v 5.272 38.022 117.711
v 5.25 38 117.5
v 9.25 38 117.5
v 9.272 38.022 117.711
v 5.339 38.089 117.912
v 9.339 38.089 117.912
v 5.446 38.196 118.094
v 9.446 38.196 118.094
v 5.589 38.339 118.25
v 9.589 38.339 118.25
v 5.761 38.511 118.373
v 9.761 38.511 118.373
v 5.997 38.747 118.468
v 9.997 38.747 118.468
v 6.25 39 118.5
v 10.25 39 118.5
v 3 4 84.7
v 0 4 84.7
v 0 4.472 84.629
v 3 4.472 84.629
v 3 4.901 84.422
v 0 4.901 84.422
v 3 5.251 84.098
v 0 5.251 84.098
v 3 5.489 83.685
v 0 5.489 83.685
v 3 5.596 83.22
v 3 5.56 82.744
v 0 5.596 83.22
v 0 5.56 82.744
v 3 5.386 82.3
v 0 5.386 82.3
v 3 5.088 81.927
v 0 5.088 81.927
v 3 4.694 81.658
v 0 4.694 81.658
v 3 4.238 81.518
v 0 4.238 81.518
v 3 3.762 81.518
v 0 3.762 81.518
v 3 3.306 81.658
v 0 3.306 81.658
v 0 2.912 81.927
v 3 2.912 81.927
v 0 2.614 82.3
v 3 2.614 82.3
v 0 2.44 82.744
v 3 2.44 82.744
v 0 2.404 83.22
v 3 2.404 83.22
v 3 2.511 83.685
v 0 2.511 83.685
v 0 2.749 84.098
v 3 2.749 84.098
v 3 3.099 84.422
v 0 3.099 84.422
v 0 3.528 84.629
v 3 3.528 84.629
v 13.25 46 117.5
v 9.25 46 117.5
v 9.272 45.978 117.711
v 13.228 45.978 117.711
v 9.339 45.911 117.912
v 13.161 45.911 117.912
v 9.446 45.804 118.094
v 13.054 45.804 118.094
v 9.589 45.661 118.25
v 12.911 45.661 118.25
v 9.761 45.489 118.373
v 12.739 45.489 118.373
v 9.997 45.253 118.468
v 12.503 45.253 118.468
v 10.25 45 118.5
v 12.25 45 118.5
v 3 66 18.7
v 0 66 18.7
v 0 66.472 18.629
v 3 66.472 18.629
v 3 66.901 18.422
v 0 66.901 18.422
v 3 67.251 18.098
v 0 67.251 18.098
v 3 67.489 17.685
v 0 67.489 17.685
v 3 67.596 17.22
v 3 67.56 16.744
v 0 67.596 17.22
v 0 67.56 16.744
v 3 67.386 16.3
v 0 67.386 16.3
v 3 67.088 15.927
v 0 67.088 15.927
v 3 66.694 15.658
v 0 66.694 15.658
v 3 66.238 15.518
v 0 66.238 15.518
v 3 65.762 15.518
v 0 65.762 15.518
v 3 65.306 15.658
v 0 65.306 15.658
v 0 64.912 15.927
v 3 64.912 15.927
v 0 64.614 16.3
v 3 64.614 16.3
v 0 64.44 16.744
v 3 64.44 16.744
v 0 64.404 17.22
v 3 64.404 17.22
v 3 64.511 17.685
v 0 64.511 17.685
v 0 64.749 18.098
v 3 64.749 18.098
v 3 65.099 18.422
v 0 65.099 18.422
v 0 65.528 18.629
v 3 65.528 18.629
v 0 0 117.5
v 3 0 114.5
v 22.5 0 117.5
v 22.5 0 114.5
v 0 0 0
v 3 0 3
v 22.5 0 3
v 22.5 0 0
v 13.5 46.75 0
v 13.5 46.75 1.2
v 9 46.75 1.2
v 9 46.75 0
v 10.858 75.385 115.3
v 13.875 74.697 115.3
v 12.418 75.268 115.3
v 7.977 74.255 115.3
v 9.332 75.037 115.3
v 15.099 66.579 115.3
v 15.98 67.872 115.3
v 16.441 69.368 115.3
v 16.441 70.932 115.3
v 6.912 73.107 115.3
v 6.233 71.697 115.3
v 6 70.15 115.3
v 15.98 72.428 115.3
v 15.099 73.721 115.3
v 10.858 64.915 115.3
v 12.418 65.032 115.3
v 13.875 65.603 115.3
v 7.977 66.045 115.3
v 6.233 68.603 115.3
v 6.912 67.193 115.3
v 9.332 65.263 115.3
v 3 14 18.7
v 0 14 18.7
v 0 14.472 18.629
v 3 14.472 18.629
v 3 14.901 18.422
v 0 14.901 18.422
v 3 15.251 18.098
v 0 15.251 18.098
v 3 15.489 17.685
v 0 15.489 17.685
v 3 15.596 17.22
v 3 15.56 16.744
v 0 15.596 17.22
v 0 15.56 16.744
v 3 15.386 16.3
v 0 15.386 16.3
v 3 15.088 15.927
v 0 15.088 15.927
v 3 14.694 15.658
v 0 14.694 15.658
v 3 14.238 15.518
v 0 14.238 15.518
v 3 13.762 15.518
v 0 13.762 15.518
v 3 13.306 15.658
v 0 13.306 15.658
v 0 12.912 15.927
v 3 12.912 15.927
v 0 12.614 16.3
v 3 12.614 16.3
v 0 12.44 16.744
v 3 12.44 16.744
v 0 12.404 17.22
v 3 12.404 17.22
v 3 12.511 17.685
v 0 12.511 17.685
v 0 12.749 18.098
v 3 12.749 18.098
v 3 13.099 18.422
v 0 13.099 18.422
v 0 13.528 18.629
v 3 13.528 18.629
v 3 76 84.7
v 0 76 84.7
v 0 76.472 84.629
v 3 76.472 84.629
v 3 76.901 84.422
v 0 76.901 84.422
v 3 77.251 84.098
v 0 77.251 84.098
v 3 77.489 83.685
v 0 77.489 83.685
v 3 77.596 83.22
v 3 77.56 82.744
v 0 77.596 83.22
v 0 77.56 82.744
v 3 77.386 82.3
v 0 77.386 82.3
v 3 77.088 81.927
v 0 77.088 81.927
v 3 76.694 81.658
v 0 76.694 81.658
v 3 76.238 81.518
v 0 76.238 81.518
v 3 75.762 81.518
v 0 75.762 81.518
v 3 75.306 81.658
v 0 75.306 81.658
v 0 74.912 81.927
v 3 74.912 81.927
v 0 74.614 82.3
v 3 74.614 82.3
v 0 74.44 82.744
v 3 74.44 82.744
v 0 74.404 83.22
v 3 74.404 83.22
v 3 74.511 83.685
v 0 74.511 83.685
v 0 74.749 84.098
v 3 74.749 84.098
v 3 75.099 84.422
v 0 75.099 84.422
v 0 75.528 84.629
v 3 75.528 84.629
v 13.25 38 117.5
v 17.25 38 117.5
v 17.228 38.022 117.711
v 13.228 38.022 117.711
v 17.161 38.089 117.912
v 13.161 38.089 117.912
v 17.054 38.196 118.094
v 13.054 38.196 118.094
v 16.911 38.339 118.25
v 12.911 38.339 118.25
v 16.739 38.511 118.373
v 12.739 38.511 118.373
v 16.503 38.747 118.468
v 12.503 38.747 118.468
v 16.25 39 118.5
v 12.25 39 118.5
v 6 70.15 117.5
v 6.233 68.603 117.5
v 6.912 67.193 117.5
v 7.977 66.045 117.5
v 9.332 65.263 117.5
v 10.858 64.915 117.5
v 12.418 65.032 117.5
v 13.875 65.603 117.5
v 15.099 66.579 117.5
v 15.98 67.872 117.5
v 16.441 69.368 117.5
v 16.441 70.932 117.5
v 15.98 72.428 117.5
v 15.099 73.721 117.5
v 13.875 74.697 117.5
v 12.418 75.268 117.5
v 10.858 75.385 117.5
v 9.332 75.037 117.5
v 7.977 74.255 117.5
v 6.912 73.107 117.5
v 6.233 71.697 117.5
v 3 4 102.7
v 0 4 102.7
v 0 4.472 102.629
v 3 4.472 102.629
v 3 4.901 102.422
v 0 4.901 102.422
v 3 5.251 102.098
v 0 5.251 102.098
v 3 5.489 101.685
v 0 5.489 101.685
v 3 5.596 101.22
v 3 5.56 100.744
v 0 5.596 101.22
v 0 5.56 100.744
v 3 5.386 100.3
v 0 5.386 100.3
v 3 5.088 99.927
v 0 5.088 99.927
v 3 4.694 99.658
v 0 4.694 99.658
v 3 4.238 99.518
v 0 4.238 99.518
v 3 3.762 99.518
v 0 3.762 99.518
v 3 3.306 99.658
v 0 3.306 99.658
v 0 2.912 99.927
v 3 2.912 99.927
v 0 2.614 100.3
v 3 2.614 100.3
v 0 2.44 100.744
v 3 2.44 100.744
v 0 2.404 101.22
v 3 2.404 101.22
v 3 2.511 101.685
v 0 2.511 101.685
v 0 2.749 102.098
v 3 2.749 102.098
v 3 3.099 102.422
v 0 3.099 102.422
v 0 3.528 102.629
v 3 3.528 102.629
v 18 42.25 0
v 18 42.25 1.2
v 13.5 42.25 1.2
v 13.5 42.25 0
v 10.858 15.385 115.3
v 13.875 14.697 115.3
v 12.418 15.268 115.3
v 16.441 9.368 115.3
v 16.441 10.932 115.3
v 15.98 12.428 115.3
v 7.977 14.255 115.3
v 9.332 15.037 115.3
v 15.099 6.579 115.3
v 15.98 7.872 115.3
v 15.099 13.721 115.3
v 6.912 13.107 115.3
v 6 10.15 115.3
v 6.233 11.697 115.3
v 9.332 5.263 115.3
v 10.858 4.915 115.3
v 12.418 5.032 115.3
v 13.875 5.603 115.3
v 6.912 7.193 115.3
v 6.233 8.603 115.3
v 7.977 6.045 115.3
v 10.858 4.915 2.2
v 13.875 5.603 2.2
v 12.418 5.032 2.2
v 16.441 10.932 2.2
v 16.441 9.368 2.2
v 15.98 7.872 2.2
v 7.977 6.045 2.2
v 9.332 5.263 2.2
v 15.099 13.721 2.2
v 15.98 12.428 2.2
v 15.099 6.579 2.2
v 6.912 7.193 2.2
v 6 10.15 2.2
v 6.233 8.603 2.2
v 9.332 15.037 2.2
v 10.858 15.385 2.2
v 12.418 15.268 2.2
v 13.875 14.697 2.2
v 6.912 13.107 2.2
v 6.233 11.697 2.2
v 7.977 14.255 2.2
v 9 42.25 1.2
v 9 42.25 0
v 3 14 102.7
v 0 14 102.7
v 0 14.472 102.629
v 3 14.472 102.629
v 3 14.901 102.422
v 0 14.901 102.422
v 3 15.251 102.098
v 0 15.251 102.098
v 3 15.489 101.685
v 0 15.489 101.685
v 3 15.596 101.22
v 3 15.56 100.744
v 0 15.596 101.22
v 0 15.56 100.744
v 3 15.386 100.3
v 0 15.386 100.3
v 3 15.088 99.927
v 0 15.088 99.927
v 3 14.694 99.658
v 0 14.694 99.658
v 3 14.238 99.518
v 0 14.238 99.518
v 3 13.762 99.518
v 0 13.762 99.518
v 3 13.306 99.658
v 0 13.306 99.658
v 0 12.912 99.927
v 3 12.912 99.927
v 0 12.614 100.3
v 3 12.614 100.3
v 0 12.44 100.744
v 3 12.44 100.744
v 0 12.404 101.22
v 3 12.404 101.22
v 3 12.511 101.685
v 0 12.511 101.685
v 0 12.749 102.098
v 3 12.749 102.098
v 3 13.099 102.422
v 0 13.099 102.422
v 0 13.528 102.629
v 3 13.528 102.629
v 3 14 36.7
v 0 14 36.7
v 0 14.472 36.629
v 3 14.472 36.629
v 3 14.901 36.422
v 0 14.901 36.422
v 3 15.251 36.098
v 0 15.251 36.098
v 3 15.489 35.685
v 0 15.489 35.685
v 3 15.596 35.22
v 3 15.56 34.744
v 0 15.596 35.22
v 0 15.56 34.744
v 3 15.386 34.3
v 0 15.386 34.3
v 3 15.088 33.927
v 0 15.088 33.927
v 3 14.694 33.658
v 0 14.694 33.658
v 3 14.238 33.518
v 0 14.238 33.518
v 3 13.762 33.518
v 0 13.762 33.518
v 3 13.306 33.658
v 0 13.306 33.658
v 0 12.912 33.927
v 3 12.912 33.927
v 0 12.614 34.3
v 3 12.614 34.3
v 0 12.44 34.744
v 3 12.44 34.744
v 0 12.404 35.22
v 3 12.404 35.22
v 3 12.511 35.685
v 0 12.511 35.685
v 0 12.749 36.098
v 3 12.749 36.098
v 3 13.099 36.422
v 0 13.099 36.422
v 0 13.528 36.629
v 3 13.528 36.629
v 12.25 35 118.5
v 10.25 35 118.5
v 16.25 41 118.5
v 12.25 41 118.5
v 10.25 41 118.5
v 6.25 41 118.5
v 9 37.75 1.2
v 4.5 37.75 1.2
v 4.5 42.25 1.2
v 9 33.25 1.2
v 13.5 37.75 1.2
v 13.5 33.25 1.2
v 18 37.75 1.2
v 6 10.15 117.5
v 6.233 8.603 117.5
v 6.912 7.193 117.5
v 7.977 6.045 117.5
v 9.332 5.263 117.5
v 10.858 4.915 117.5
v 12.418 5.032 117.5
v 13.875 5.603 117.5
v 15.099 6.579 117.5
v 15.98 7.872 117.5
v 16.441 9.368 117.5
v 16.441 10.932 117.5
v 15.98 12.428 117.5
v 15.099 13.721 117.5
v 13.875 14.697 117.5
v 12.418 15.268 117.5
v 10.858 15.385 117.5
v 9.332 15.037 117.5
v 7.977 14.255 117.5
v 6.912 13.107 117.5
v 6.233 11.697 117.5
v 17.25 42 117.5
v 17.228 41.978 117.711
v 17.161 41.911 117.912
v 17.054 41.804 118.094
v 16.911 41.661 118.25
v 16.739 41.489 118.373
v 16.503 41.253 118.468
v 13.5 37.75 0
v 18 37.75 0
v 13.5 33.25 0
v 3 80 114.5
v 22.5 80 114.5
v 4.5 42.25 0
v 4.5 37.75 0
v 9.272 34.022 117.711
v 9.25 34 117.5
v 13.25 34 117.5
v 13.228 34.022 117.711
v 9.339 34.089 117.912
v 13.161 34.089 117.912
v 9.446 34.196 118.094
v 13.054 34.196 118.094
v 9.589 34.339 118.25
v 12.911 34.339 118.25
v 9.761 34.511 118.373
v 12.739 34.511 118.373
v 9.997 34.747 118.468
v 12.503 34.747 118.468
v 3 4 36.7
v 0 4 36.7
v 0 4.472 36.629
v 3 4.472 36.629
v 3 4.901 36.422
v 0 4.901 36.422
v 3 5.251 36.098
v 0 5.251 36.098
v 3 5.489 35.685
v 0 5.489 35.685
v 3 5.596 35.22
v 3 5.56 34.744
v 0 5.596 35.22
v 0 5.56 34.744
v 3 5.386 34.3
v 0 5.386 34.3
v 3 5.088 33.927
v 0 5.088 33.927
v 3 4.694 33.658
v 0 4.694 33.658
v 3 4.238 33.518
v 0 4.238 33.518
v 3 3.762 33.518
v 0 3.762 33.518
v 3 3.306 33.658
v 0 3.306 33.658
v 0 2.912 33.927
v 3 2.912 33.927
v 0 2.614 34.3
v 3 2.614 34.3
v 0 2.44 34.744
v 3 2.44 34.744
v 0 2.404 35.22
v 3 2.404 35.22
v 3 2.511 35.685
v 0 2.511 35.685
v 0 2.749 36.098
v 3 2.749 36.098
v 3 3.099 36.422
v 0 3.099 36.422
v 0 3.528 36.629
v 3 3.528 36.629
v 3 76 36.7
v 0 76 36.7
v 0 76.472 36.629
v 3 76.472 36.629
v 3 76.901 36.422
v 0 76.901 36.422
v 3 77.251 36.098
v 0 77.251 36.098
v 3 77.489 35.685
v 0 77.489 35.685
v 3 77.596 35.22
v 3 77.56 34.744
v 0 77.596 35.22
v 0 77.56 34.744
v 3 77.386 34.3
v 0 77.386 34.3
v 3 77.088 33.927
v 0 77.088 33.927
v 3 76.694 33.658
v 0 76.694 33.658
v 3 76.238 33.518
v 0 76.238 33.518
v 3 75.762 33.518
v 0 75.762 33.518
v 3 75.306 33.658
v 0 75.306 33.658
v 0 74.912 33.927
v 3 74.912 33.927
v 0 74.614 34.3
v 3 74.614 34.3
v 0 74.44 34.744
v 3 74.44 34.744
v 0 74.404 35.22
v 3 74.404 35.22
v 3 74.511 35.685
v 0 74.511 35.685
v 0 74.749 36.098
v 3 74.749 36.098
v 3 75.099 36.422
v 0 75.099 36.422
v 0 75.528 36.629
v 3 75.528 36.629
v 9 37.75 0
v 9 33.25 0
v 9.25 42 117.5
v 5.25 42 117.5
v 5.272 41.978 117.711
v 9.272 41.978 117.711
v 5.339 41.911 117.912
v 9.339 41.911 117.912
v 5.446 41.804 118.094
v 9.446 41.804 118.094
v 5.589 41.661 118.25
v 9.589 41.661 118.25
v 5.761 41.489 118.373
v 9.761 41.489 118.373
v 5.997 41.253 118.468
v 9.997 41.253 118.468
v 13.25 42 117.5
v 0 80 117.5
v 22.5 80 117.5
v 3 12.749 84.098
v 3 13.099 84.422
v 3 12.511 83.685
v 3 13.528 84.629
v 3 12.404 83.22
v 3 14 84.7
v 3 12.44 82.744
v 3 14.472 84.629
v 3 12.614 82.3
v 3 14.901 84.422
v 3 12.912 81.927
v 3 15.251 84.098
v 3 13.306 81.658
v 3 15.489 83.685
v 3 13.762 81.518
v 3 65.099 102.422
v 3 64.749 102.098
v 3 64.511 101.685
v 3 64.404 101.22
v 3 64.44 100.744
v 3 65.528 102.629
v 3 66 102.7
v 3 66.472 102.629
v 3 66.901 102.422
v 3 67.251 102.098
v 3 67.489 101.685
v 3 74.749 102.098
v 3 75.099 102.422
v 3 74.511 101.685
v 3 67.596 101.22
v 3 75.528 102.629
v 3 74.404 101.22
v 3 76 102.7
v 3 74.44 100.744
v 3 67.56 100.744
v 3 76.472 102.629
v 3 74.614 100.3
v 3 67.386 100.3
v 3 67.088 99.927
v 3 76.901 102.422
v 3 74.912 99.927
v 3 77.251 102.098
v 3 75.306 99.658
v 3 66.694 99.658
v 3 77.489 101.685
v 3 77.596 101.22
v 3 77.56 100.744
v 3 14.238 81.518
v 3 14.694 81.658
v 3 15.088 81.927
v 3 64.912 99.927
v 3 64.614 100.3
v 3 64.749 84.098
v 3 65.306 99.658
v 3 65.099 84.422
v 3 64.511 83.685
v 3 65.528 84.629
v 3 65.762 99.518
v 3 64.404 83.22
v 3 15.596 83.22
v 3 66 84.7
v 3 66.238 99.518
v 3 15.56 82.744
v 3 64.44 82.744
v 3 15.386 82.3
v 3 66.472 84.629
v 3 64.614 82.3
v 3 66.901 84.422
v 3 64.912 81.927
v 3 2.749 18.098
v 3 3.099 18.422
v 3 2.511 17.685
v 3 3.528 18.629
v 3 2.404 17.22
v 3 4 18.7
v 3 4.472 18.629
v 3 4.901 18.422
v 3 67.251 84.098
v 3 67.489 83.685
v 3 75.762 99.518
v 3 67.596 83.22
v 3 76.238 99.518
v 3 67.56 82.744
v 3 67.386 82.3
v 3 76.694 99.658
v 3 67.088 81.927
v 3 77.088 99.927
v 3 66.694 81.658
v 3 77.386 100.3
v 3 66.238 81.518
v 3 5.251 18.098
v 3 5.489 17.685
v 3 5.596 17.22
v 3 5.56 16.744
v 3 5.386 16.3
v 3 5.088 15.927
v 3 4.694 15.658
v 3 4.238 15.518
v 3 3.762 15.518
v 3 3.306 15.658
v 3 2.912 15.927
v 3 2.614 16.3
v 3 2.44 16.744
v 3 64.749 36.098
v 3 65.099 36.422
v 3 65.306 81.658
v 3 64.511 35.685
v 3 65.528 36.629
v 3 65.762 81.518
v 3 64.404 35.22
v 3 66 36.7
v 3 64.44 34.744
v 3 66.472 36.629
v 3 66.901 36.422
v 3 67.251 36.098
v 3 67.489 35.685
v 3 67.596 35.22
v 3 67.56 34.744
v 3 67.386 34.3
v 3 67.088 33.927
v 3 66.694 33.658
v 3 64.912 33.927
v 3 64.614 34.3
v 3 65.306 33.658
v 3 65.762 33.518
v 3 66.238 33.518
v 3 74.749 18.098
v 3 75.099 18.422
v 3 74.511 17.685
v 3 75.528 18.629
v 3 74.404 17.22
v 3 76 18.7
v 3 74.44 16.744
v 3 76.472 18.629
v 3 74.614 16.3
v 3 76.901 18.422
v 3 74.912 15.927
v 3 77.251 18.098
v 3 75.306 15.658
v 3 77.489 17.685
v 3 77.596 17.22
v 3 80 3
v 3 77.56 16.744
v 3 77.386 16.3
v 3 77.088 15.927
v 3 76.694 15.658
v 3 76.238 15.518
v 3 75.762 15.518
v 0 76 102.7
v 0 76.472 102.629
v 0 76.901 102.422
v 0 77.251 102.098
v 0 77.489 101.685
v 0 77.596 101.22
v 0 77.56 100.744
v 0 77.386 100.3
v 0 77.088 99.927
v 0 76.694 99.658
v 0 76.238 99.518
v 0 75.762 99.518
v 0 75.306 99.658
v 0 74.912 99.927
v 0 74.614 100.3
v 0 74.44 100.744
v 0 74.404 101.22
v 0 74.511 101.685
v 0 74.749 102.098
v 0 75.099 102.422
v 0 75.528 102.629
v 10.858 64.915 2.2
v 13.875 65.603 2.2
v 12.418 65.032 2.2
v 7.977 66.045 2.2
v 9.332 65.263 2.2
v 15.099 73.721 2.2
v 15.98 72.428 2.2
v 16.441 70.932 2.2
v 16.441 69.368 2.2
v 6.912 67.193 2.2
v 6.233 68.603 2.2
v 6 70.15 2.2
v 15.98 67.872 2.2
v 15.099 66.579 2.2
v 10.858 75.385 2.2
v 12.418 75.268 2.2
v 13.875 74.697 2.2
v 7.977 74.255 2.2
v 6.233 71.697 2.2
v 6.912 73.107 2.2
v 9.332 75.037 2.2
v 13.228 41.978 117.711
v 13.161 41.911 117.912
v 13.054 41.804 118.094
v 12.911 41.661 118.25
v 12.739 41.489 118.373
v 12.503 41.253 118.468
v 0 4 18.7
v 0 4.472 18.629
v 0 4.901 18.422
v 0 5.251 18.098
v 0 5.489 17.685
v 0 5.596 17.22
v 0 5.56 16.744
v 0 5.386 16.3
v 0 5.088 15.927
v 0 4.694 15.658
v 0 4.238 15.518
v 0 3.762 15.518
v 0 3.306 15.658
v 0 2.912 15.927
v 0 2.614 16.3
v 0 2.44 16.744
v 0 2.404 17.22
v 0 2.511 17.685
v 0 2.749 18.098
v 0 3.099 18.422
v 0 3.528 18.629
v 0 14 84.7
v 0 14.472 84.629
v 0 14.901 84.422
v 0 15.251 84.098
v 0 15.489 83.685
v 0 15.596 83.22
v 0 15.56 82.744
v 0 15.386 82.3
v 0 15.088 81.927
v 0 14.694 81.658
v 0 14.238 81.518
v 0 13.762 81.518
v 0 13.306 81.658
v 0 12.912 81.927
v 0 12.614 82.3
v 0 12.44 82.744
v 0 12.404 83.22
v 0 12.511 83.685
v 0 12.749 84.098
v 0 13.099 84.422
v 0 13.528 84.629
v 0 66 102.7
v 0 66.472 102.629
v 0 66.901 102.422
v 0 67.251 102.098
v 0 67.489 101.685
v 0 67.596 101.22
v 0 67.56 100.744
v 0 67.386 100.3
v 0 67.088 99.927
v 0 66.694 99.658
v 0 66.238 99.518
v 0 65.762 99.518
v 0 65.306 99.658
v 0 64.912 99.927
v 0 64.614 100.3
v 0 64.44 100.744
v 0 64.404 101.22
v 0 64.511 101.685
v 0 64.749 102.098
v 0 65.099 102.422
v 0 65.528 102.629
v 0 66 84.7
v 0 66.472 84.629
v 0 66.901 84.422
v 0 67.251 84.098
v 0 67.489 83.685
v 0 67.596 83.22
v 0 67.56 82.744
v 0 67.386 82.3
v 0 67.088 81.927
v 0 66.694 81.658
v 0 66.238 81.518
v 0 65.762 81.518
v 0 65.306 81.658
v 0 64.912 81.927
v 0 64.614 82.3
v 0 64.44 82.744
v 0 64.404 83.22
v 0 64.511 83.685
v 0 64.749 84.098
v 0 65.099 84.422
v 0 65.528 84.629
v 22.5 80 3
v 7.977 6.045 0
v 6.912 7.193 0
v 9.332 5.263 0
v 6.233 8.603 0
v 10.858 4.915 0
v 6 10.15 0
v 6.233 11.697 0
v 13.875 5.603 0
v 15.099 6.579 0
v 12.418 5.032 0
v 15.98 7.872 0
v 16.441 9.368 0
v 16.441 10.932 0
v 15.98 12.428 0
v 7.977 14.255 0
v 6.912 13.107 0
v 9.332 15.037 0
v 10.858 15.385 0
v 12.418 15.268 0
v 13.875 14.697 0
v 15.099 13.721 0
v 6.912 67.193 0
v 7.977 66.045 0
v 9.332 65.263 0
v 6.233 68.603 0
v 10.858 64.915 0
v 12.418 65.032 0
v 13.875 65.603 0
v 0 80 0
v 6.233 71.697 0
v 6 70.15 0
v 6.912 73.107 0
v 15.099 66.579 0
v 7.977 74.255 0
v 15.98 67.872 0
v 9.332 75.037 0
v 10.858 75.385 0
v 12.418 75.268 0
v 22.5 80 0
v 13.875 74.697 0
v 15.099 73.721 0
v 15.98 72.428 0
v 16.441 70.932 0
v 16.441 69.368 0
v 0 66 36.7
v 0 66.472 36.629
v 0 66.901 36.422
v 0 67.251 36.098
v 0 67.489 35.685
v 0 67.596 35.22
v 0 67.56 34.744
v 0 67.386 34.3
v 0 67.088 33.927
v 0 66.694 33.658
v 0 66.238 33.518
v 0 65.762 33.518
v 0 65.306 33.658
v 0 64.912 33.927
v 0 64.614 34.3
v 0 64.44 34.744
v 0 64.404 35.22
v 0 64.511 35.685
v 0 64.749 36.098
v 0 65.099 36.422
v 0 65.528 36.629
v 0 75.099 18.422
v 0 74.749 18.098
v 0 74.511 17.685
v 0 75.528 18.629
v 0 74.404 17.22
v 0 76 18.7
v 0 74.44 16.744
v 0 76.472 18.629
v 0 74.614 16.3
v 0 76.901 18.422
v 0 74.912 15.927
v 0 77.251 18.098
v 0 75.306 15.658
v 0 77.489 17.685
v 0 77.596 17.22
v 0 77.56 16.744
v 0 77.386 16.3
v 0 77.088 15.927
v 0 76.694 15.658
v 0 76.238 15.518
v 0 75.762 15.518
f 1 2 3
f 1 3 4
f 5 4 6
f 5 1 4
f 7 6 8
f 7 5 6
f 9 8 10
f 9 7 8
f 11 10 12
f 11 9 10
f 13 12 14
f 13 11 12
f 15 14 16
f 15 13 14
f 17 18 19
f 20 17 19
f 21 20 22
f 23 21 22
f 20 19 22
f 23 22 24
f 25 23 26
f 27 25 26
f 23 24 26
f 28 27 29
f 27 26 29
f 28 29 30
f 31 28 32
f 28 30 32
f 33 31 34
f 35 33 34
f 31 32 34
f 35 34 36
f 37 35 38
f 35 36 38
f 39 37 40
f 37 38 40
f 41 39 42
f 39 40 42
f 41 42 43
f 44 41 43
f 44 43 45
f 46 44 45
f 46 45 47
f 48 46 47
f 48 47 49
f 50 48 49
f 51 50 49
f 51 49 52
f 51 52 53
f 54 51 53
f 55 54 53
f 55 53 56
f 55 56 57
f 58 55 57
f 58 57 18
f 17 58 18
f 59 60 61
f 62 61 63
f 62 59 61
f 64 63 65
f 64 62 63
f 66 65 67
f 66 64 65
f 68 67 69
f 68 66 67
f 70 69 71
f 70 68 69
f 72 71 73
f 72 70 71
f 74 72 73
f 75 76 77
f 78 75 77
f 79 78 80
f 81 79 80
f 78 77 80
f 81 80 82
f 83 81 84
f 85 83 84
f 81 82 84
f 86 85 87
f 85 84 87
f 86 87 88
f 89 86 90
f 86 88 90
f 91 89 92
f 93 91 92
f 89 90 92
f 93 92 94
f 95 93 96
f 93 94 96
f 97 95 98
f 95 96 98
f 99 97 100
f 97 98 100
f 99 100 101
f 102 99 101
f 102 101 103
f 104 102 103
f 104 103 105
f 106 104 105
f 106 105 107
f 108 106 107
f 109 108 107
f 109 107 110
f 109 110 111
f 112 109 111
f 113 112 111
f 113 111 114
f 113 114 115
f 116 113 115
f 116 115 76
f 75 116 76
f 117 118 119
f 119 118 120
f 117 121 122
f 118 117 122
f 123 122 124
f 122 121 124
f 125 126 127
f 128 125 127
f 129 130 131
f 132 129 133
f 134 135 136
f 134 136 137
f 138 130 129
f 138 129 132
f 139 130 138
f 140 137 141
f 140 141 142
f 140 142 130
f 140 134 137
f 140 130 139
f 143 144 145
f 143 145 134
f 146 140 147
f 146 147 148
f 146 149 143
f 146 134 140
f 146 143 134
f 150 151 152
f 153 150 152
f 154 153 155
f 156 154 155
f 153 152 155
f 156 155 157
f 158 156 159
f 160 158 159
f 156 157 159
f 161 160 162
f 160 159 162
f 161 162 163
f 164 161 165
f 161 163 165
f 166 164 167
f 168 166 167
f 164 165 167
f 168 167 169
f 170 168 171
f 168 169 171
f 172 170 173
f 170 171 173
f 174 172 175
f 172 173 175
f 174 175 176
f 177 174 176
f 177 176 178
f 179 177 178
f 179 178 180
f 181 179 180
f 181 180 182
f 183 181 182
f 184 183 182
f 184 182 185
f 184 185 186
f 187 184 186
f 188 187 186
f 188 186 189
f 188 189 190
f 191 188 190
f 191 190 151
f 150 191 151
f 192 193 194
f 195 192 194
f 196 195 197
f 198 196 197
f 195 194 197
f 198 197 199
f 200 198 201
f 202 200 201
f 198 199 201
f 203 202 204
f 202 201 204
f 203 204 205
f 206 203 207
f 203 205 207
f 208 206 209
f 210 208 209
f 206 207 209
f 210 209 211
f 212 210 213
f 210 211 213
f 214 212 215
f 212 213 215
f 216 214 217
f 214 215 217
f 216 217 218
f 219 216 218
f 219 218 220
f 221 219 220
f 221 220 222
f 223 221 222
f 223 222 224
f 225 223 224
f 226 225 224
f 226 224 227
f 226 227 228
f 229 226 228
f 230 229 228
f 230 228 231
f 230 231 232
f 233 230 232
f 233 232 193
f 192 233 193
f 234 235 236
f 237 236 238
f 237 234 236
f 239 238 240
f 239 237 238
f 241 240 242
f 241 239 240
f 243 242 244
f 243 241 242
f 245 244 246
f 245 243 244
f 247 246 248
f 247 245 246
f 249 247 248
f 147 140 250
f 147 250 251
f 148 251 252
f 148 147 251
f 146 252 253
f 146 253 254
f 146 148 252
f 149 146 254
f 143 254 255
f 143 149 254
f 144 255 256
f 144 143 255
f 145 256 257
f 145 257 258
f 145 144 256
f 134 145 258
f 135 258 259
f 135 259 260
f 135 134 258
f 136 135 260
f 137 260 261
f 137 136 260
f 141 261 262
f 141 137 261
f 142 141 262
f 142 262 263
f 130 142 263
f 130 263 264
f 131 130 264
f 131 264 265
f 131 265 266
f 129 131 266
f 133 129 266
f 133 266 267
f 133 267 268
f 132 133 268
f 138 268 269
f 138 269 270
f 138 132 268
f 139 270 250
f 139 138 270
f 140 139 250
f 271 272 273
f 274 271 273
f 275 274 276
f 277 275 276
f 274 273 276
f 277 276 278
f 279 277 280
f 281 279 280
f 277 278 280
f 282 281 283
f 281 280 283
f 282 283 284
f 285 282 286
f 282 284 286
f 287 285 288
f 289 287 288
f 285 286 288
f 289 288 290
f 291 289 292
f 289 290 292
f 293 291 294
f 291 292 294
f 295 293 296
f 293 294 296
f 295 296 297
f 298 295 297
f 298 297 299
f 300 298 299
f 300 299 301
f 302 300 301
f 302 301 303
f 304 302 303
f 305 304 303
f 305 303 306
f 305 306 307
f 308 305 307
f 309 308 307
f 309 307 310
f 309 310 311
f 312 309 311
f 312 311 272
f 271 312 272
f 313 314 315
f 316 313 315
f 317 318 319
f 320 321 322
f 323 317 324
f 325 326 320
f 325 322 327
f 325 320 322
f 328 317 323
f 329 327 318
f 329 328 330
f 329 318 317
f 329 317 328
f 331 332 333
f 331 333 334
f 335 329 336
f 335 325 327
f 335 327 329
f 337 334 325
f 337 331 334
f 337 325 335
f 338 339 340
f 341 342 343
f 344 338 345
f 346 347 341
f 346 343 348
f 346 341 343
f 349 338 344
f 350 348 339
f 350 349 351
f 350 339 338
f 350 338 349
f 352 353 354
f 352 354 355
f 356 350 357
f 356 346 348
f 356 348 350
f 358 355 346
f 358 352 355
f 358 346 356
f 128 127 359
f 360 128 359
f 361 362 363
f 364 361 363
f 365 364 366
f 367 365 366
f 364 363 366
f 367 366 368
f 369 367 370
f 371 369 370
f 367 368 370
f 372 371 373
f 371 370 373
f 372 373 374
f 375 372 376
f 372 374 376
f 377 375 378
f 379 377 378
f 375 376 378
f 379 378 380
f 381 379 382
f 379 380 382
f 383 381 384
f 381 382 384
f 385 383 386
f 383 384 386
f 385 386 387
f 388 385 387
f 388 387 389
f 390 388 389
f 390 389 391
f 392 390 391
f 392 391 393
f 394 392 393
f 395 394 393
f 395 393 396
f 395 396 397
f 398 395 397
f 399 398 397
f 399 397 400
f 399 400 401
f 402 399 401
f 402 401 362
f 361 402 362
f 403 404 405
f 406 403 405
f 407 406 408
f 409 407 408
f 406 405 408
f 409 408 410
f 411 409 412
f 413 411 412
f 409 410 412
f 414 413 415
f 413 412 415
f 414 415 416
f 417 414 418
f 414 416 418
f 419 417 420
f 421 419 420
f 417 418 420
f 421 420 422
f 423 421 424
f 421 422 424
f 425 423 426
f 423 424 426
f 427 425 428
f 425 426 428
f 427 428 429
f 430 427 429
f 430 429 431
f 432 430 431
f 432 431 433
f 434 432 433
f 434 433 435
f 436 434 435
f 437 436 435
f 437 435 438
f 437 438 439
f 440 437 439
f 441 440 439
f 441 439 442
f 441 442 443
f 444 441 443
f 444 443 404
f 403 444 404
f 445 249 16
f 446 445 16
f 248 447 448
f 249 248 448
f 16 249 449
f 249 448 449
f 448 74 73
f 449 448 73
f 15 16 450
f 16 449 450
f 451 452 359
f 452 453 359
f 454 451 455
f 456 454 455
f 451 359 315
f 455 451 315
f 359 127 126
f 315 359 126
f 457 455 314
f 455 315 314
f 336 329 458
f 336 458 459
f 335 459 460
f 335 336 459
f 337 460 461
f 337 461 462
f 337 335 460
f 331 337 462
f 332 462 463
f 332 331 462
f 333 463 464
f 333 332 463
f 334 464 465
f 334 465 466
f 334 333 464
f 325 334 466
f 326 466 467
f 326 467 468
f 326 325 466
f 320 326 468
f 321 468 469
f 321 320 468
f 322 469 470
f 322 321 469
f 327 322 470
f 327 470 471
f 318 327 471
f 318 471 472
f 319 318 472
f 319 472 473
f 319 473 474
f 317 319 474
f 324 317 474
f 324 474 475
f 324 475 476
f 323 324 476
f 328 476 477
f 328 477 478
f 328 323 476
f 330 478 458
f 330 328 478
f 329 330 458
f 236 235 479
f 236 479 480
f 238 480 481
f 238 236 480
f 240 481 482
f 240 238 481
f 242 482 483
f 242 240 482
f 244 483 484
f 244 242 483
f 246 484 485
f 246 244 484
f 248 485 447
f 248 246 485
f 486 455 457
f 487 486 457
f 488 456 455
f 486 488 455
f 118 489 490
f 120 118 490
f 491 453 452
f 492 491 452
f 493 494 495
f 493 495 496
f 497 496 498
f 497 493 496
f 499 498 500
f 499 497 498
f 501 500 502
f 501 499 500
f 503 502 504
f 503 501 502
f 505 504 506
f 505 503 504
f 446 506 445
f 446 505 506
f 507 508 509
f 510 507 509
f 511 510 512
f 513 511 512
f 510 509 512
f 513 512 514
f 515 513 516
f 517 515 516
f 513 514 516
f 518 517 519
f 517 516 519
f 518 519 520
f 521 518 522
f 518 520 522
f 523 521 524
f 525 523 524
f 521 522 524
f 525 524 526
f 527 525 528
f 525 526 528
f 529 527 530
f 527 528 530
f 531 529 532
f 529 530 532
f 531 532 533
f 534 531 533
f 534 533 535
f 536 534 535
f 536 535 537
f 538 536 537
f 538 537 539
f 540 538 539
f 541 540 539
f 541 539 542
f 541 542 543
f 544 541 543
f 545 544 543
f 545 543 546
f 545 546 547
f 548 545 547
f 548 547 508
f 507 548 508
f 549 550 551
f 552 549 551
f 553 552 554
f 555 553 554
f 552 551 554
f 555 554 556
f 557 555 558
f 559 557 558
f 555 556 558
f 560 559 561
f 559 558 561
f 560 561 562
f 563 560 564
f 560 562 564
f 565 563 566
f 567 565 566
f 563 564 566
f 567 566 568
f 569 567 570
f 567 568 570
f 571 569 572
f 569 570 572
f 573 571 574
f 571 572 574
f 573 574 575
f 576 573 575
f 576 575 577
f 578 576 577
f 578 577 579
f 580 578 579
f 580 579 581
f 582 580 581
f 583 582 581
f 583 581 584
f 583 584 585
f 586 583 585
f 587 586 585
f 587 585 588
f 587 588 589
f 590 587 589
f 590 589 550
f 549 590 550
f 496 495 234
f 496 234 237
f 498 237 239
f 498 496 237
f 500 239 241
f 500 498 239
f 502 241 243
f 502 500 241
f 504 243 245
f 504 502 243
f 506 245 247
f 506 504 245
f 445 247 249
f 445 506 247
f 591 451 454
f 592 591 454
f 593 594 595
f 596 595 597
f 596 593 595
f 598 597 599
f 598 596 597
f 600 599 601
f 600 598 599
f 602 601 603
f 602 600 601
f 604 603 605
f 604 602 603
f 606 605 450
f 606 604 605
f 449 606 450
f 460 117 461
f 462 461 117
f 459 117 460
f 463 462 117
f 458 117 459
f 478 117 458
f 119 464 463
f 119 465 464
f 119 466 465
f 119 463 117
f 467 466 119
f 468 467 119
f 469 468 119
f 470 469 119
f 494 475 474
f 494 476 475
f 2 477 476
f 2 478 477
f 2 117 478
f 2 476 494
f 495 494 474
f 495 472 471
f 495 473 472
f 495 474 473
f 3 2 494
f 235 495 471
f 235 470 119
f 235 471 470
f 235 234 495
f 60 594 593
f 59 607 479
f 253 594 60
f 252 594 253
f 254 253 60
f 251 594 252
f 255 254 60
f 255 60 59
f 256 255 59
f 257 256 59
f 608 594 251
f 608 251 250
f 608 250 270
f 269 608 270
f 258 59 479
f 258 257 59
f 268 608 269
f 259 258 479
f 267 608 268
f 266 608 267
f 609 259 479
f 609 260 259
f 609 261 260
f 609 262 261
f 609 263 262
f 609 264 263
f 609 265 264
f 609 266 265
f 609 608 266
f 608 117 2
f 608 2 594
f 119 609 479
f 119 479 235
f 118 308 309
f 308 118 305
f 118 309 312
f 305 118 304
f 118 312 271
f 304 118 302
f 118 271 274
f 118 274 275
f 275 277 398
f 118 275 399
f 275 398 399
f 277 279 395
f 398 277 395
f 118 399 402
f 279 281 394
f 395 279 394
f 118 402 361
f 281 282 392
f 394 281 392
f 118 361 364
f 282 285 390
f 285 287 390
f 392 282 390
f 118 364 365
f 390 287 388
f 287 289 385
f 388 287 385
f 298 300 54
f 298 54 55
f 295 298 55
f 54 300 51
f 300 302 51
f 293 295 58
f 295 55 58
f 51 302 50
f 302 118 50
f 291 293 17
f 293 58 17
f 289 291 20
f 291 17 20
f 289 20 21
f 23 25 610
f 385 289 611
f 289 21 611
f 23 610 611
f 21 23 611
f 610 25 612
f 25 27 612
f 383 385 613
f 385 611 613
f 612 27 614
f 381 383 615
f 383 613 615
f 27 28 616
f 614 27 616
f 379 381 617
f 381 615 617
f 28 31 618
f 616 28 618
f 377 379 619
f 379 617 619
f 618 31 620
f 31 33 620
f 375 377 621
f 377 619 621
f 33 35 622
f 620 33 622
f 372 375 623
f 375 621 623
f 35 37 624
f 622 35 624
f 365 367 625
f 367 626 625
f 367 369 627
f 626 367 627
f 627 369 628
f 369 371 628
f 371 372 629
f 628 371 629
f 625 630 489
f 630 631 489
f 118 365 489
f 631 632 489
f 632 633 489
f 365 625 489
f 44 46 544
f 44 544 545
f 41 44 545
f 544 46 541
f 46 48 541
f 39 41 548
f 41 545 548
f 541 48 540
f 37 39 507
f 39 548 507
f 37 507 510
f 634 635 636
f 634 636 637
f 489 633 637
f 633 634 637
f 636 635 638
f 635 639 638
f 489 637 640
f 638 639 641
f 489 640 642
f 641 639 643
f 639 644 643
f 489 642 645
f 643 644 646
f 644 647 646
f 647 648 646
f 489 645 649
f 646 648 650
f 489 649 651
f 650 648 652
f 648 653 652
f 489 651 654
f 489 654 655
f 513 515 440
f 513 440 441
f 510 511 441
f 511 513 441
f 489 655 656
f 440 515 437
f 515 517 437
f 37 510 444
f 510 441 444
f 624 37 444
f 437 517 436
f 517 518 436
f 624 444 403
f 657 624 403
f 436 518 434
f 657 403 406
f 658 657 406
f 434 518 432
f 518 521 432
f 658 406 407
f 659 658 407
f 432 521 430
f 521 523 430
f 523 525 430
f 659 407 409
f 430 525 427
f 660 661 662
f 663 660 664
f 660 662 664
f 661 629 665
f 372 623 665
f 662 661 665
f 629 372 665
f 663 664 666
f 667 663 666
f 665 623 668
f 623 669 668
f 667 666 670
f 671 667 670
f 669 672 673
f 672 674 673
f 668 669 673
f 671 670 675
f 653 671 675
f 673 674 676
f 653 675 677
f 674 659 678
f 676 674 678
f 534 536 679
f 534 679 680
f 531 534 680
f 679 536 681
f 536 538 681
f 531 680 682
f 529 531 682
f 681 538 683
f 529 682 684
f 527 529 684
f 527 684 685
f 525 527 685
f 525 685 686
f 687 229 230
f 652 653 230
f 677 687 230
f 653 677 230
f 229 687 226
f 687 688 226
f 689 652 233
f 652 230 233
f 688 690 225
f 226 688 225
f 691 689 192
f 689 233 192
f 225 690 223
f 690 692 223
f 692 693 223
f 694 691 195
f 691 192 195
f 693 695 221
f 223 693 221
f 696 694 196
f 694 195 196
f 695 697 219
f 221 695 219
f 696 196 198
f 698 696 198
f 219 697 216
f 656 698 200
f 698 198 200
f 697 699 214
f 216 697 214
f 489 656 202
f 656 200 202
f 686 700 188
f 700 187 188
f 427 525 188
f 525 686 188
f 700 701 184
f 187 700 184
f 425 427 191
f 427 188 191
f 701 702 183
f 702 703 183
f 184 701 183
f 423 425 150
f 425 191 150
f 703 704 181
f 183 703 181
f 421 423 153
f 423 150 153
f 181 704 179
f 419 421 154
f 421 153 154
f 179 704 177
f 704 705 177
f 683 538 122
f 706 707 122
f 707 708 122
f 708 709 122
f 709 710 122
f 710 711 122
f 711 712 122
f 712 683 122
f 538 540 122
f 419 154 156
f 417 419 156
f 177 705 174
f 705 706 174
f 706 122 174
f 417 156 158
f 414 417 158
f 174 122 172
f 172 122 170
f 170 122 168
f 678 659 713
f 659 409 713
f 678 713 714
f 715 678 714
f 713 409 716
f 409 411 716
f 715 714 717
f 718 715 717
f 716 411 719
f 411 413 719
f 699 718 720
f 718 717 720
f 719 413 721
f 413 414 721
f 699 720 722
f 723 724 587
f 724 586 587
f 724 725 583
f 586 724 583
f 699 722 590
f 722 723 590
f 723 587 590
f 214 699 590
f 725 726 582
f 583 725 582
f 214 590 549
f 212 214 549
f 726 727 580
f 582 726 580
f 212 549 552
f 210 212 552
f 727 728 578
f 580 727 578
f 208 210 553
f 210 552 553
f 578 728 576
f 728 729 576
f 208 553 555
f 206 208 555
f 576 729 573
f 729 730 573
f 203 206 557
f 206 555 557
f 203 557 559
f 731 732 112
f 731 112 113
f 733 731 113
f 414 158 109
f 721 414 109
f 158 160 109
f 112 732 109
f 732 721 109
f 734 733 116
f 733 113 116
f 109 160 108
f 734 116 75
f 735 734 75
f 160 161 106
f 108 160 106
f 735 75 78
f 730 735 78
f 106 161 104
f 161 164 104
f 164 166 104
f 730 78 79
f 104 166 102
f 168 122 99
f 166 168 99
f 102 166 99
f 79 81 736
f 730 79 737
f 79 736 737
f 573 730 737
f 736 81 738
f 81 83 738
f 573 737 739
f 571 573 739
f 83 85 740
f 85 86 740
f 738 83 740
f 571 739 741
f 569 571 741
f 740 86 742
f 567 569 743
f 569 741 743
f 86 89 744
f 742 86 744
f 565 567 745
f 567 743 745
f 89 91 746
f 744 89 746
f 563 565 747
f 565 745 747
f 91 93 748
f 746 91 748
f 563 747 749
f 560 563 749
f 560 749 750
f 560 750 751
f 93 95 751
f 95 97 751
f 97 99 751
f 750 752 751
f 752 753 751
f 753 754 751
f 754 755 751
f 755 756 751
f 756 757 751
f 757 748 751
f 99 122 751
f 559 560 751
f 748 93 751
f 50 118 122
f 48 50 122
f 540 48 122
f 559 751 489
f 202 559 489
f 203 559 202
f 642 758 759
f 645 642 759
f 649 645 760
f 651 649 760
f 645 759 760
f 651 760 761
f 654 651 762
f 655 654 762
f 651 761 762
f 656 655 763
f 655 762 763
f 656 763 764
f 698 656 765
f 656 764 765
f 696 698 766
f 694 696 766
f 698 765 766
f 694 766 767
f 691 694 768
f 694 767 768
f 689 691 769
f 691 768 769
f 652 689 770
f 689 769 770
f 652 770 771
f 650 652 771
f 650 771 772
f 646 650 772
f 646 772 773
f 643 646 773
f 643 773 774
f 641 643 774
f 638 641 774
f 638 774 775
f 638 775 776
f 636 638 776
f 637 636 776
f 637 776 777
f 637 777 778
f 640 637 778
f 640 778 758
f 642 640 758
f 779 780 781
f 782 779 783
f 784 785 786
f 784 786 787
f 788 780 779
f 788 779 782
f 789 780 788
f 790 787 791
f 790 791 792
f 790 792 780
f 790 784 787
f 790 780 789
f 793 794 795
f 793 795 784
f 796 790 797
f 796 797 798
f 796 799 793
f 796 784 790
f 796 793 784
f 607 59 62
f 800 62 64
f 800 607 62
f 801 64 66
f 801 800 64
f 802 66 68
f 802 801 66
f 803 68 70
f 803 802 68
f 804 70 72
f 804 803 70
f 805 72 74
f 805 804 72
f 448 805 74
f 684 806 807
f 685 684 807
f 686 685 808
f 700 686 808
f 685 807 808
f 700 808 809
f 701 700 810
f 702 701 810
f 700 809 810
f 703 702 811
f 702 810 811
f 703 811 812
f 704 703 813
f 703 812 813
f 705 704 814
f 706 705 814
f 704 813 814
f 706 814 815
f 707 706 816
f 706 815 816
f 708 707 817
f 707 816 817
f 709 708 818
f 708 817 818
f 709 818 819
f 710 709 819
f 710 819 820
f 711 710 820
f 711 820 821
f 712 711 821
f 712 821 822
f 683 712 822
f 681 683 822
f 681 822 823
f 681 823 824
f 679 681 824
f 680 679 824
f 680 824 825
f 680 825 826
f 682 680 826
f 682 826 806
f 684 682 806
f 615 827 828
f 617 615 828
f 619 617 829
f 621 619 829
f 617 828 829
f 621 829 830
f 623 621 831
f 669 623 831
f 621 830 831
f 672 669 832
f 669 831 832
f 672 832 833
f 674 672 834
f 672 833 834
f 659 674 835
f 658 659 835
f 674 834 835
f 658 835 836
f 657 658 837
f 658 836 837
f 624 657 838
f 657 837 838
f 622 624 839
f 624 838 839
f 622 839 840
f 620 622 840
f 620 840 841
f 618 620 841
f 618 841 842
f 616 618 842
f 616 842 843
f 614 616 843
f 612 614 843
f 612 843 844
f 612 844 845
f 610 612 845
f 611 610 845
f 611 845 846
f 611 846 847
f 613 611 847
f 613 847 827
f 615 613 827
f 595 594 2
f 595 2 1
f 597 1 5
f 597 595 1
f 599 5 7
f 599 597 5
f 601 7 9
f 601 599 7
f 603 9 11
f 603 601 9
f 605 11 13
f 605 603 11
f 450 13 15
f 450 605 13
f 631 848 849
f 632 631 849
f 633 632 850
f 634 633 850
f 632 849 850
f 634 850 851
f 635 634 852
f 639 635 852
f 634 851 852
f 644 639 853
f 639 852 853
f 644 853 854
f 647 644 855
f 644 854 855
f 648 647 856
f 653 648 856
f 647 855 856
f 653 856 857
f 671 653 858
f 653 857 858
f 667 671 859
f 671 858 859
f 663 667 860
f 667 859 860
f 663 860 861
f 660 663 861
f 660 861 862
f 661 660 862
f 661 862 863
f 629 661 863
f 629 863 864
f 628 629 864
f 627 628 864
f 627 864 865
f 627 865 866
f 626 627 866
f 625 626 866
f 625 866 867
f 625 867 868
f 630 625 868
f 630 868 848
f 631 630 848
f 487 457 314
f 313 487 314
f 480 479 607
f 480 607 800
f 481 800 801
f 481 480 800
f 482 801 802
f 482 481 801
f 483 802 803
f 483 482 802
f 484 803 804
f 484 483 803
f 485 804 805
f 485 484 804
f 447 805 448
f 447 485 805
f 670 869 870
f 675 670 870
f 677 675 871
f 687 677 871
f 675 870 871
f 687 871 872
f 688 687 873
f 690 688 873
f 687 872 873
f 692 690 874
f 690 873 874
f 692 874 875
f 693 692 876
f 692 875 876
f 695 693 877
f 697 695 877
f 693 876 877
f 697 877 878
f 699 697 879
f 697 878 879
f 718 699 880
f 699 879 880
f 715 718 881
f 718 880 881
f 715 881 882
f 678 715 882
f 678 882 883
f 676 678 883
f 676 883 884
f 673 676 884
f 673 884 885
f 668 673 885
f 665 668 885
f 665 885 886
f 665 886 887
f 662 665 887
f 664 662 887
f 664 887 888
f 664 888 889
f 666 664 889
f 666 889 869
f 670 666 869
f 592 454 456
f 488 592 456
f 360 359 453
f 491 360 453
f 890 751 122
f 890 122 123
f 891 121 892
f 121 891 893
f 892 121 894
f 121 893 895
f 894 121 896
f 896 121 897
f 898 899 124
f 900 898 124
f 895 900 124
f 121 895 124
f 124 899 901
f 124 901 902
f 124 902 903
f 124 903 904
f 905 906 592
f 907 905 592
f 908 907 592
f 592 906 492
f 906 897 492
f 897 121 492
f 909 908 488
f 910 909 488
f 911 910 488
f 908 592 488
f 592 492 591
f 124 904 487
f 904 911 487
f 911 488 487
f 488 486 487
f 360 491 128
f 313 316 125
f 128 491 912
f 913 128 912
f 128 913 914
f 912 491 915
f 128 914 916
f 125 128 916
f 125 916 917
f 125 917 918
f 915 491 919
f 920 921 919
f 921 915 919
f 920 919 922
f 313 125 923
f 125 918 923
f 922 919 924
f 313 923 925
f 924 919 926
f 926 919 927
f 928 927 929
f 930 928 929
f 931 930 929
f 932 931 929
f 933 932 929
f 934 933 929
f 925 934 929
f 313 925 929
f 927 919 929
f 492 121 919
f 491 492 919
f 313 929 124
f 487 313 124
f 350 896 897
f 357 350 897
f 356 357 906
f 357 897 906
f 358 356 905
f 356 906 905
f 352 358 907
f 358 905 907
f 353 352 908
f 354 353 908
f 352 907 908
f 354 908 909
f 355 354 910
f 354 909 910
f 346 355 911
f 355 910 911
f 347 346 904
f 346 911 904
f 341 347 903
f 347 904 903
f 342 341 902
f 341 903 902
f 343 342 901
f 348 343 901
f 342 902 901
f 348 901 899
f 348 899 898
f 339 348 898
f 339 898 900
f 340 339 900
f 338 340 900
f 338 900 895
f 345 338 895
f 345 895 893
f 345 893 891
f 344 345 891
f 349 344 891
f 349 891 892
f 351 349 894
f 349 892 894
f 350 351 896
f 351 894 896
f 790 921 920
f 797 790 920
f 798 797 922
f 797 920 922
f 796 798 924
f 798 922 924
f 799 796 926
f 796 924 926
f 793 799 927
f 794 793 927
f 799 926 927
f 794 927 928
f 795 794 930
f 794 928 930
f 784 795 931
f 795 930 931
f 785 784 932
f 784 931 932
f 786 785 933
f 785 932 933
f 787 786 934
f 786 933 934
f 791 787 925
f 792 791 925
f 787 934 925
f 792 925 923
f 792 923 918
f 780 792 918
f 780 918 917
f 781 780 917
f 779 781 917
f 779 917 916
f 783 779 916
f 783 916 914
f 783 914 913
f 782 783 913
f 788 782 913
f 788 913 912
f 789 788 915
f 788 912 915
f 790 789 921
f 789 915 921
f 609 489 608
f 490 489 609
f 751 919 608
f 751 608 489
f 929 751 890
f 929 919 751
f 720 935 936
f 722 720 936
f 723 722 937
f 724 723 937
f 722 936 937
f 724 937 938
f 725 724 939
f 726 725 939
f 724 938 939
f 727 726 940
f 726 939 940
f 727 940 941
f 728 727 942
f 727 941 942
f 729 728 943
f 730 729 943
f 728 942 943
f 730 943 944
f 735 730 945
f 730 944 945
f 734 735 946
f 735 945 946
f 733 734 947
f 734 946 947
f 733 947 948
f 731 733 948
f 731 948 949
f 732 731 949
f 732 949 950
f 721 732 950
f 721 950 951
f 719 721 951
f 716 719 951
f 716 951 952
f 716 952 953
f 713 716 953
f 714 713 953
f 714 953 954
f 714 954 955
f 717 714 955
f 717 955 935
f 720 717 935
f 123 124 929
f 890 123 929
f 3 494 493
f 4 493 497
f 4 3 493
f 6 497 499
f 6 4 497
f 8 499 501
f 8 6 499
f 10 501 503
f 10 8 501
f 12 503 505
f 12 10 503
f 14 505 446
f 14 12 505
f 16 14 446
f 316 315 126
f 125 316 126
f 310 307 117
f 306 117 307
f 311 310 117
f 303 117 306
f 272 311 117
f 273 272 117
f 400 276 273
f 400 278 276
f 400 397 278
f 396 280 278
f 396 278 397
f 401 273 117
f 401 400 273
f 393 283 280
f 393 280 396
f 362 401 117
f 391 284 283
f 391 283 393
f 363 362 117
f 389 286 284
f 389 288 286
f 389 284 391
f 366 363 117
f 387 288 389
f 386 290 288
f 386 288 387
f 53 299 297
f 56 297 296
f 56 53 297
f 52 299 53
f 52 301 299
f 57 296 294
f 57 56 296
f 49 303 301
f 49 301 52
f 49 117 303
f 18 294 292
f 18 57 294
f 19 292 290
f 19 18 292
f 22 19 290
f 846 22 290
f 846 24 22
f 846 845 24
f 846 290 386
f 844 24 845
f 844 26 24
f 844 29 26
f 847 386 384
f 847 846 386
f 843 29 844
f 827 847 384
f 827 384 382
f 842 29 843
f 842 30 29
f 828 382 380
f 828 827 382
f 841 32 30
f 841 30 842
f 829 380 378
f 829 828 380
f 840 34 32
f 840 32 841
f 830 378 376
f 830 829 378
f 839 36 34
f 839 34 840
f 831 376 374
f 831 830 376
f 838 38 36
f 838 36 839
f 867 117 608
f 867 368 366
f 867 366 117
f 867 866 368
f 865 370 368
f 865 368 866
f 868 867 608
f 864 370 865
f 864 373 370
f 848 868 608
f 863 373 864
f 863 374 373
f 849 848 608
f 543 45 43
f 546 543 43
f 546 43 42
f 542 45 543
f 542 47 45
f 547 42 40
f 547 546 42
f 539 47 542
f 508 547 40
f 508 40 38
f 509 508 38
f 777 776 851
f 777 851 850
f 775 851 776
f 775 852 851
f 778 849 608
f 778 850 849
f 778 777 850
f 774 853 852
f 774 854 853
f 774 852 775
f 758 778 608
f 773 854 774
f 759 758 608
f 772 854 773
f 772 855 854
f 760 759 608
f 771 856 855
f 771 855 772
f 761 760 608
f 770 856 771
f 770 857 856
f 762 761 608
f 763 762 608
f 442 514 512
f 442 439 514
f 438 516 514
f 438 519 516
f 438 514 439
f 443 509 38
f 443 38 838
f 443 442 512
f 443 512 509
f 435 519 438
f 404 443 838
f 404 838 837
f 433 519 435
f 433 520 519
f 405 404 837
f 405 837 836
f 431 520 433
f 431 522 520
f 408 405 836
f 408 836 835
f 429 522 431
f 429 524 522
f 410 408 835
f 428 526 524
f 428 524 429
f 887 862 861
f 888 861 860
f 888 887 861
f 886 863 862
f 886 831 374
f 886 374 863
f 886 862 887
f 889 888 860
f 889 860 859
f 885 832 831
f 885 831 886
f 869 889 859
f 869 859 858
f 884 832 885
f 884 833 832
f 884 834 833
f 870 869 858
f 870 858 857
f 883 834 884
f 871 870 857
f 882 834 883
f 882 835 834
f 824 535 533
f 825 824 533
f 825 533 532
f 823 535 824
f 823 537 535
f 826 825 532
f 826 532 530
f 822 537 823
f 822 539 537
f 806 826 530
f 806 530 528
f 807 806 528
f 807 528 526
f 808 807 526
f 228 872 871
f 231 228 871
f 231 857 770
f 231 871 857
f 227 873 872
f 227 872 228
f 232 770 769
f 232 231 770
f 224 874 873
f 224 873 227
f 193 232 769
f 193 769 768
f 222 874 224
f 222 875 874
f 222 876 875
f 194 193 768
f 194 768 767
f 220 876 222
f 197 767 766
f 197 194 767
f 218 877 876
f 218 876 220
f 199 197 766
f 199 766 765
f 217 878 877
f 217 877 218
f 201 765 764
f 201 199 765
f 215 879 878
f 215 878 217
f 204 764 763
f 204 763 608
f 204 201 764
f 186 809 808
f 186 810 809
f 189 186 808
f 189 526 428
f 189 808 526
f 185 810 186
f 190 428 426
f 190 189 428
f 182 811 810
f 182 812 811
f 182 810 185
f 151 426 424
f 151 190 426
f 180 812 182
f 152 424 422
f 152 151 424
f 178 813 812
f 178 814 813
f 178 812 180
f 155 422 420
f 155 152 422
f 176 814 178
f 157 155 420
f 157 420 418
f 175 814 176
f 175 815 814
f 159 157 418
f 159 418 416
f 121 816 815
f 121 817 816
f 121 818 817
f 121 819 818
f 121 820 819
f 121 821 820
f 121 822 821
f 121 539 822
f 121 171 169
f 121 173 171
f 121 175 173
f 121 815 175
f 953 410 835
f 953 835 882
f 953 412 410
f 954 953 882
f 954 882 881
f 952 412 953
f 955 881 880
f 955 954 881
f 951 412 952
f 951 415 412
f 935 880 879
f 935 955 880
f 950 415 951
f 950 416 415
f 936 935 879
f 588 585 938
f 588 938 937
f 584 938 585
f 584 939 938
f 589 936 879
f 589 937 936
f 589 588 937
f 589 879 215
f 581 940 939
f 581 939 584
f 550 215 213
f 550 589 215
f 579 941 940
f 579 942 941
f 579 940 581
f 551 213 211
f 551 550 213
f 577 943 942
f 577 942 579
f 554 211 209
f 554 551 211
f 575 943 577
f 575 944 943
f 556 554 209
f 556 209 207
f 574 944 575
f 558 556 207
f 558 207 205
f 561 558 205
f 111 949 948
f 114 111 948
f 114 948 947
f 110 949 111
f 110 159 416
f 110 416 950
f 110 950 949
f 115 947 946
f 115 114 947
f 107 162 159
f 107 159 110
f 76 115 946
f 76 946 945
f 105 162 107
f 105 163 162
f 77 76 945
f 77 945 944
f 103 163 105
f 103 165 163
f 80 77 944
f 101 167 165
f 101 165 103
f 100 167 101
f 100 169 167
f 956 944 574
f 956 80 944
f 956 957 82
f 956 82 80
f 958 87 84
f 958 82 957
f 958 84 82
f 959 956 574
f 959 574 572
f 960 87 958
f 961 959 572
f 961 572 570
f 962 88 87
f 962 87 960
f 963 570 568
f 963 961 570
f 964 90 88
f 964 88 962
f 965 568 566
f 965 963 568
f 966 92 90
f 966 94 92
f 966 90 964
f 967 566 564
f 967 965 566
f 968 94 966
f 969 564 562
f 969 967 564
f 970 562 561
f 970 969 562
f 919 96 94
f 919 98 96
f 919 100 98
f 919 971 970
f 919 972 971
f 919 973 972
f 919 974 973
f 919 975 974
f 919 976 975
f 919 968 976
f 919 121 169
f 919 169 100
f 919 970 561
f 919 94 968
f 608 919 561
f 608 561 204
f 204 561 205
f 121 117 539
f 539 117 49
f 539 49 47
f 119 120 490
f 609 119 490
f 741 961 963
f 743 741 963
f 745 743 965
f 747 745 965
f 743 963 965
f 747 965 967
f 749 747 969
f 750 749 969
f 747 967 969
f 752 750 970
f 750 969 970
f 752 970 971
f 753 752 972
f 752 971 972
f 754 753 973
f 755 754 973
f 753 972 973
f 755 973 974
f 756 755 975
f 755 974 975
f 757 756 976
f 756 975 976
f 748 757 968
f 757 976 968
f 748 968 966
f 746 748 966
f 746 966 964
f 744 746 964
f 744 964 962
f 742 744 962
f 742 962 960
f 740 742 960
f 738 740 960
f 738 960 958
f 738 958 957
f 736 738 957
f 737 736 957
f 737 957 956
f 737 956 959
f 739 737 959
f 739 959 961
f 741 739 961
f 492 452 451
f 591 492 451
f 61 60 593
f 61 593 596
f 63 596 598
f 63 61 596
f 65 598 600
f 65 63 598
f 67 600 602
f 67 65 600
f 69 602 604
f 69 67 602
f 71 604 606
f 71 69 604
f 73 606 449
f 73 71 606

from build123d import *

# Parameters (mm, degrees)
ESQUISSE1_W             = 22.5
ESQUISSE1_H             = 80
BOSS_EXTRU_1_DEPTH      = 3
ESQUISSE2_W             = 3
ESQUISSE2_H             = 80
BOSS_EXTRU_2_DEPTH      = 111.5
ESQUISSE3_W             = 22.5
ESQUISSE3_H             = 80
BOSS_EXTRU_3_DEPTH      = 3
ESQUISSE4_R             = 5.25
ENL_V_MAT_EXTRU_1_DEPTH = 2.2
ENL_V_START             = -1.8
ENL_V_MAT_EXTRU_2_DEPTH = 1.2
ENL_V_START_2           = -2.2
ESQUISSE6_R             = 5.25
ENL_V_MAT_EXTRU_3_DEPTH = 2.2
BOSS_EXTRU_4_DEPTH      = 1
ESQUISSE8_R             = 1.6
ENL_V_MAT_EXTRU_4_DEPTH = 4
CONG_2_R                = 1


with BuildPart() as part:
    # Esquisse1 → Boss.-Extru.1 (new body)
    with BuildSketch(Plane.XY):
        with Locations((11.25, 40)):
            Rectangle(ESQUISSE1_W, ESQUISSE1_H)
    extrude(amount=BOSS_EXTRU_1_DEPTH)

    # Esquisse2 → Boss.-Extru.2 (add)
    with BuildSketch(Plane.XY.offset(3)):
        with Locations((1.5, 40)):
            Rectangle(ESQUISSE2_W, ESQUISSE2_H)
    extrude(amount=BOSS_EXTRU_2_DEPTH)

    # Esquisse3 → Boss.-Extru.3 (add)
    with BuildSketch(Plane.XY.offset(114.5)):
        with Locations((11.25, 40)):
            Rectangle(ESQUISSE3_W, ESQUISSE3_H)
    extrude(amount=BOSS_EXTRU_3_DEPTH)

    # Esquisse4 → Enlèv. mat.-Extru.1 (cut)
    with BuildSketch(Plane(origin=(0, 0, 0), x_dir=(-1, 0, 0), z_dir=(0, 0, -1))):
        with Locations((-11.25, 10.15)):
            Circle(ESQUISSE4_R)
        with Locations((-11.25, 70.15)):
            Circle(ESQUISSE4_R)
    extrude(amount=-ENL_V_MAT_EXTRU_1_DEPTH, mode=Mode.SUBTRACT)

    # Esquisse5 → Enlèv. mat.-Extru.2 (cut)
    with BuildSketch(Plane.XY.offset(3).offset(ENL_V_START)):
        Polygon((4.5, 37.75), (9, 37.75), (9, 33.25), (13.5, 33.25), (13.5, 37.75), (18, 37.75), (18, 42.25), (13.5, 42.25), (13.5, 46.75), (9, 46.75), (9, 42.25), (4.5, 42.25), align=None)
    extrude(amount=-ENL_V_MAT_EXTRU_2_DEPTH, mode=Mode.SUBTRACT)

    # Esquisse6 → Enlèv. mat.-Extru.3 (cut)
    with BuildSketch(Plane.XY.offset(117.5).offset(ENL_V_START_2)):
        with Locations(Location((11.25, 10.15, 0), (0, 0, 180))):
            Circle(ESQUISSE6_R)
        with Locations(Location((11.25, 70.15, 0), (0, 0, 180))):
            Circle(ESQUISSE6_R)
    extrude(amount=ENL_V_MAT_EXTRU_3_DEPTH, mode=Mode.SUBTRACT)

    # Esquisse7 → Boss.-Extru.4 (add)
    with BuildSketch(Plane.XY.offset(117.5)):
        Polygon((5.25, 42), (9.25, 42), (9.25, 46), (13.25, 46), (13.25, 42), (17.25, 42), (17.25, 38), (13.25, 38), (13.25, 34), (9.25, 34), (9.25, 38), (5.25, 38), align=None)
    extrude(amount=BOSS_EXTRU_4_DEPTH)

    # Esquisse8 → Enlèv. mat.-Extru.4 (cut)
    with BuildSketch(Plane.ZY):
        with Locations((35.1, 76)):
            Circle(ESQUISSE8_R)
        with Locations((35.1, 66)):
            Circle(ESQUISSE8_R)
        with Locations((17.1, 76)):
            Circle(ESQUISSE8_R)
        with Locations((17.1, 66)):
            Circle(ESQUISSE8_R)
        with Locations((17.1, 4)):
            Circle(ESQUISSE8_R)
        with Locations((17.1, 14)):
            Circle(ESQUISSE8_R)
        with Locations((35.1, 14)):
            Circle(ESQUISSE8_R)
        with Locations((35.1, 4)):
            Circle(ESQUISSE8_R)
        with Locations((83.1, 76)):
            Circle(ESQUISSE8_R)
        with Locations((83.1, 66)):
            Circle(ESQUISSE8_R)
        with Locations((101.1, 76)):
            Circle(ESQUISSE8_R)
        with Locations((101.1, 66)):
            Circle(ESQUISSE8_R)
        with Locations((83.1, 14)):
            Circle(ESQUISSE8_R)
        with Locations((83.1, 4)):
            Circle(ESQUISSE8_R)
        with Locations((101.1, 4)):
            Circle(ESQUISSE8_R)
        with Locations((101.1, 14)):
            Circle(ESQUISSE8_R)
    extrude(amount=-ENL_V_MAT_EXTRU_4_DEPTH, mode=Mode.SUBTRACT)

    # Congé2
    cong_2_edges = [part.edges().sort_by_distance(p)[0] for p in [
        (11.25, 46, 118.5),
        (9.25, 44, 118.5),
        (13.25, 44, 118.5),
        (15.25, 42, 118.5),
        (17.25, 40, 118.5),
        (15.25, 38, 118.5),
        (13.25, 36, 118.5),
        (9.25, 36, 118.5),
        (7.25, 38, 118.5),
        (7.25, 42, 118.5),
        (5.25, 40, 118.5),
        (11.25, 34, 118.5),
    ]]
    fillet(cong_2_edges, radius=CONG_2_R - 0.0001)  # a hair under: the kernel refuses the full size


solid = part.part
